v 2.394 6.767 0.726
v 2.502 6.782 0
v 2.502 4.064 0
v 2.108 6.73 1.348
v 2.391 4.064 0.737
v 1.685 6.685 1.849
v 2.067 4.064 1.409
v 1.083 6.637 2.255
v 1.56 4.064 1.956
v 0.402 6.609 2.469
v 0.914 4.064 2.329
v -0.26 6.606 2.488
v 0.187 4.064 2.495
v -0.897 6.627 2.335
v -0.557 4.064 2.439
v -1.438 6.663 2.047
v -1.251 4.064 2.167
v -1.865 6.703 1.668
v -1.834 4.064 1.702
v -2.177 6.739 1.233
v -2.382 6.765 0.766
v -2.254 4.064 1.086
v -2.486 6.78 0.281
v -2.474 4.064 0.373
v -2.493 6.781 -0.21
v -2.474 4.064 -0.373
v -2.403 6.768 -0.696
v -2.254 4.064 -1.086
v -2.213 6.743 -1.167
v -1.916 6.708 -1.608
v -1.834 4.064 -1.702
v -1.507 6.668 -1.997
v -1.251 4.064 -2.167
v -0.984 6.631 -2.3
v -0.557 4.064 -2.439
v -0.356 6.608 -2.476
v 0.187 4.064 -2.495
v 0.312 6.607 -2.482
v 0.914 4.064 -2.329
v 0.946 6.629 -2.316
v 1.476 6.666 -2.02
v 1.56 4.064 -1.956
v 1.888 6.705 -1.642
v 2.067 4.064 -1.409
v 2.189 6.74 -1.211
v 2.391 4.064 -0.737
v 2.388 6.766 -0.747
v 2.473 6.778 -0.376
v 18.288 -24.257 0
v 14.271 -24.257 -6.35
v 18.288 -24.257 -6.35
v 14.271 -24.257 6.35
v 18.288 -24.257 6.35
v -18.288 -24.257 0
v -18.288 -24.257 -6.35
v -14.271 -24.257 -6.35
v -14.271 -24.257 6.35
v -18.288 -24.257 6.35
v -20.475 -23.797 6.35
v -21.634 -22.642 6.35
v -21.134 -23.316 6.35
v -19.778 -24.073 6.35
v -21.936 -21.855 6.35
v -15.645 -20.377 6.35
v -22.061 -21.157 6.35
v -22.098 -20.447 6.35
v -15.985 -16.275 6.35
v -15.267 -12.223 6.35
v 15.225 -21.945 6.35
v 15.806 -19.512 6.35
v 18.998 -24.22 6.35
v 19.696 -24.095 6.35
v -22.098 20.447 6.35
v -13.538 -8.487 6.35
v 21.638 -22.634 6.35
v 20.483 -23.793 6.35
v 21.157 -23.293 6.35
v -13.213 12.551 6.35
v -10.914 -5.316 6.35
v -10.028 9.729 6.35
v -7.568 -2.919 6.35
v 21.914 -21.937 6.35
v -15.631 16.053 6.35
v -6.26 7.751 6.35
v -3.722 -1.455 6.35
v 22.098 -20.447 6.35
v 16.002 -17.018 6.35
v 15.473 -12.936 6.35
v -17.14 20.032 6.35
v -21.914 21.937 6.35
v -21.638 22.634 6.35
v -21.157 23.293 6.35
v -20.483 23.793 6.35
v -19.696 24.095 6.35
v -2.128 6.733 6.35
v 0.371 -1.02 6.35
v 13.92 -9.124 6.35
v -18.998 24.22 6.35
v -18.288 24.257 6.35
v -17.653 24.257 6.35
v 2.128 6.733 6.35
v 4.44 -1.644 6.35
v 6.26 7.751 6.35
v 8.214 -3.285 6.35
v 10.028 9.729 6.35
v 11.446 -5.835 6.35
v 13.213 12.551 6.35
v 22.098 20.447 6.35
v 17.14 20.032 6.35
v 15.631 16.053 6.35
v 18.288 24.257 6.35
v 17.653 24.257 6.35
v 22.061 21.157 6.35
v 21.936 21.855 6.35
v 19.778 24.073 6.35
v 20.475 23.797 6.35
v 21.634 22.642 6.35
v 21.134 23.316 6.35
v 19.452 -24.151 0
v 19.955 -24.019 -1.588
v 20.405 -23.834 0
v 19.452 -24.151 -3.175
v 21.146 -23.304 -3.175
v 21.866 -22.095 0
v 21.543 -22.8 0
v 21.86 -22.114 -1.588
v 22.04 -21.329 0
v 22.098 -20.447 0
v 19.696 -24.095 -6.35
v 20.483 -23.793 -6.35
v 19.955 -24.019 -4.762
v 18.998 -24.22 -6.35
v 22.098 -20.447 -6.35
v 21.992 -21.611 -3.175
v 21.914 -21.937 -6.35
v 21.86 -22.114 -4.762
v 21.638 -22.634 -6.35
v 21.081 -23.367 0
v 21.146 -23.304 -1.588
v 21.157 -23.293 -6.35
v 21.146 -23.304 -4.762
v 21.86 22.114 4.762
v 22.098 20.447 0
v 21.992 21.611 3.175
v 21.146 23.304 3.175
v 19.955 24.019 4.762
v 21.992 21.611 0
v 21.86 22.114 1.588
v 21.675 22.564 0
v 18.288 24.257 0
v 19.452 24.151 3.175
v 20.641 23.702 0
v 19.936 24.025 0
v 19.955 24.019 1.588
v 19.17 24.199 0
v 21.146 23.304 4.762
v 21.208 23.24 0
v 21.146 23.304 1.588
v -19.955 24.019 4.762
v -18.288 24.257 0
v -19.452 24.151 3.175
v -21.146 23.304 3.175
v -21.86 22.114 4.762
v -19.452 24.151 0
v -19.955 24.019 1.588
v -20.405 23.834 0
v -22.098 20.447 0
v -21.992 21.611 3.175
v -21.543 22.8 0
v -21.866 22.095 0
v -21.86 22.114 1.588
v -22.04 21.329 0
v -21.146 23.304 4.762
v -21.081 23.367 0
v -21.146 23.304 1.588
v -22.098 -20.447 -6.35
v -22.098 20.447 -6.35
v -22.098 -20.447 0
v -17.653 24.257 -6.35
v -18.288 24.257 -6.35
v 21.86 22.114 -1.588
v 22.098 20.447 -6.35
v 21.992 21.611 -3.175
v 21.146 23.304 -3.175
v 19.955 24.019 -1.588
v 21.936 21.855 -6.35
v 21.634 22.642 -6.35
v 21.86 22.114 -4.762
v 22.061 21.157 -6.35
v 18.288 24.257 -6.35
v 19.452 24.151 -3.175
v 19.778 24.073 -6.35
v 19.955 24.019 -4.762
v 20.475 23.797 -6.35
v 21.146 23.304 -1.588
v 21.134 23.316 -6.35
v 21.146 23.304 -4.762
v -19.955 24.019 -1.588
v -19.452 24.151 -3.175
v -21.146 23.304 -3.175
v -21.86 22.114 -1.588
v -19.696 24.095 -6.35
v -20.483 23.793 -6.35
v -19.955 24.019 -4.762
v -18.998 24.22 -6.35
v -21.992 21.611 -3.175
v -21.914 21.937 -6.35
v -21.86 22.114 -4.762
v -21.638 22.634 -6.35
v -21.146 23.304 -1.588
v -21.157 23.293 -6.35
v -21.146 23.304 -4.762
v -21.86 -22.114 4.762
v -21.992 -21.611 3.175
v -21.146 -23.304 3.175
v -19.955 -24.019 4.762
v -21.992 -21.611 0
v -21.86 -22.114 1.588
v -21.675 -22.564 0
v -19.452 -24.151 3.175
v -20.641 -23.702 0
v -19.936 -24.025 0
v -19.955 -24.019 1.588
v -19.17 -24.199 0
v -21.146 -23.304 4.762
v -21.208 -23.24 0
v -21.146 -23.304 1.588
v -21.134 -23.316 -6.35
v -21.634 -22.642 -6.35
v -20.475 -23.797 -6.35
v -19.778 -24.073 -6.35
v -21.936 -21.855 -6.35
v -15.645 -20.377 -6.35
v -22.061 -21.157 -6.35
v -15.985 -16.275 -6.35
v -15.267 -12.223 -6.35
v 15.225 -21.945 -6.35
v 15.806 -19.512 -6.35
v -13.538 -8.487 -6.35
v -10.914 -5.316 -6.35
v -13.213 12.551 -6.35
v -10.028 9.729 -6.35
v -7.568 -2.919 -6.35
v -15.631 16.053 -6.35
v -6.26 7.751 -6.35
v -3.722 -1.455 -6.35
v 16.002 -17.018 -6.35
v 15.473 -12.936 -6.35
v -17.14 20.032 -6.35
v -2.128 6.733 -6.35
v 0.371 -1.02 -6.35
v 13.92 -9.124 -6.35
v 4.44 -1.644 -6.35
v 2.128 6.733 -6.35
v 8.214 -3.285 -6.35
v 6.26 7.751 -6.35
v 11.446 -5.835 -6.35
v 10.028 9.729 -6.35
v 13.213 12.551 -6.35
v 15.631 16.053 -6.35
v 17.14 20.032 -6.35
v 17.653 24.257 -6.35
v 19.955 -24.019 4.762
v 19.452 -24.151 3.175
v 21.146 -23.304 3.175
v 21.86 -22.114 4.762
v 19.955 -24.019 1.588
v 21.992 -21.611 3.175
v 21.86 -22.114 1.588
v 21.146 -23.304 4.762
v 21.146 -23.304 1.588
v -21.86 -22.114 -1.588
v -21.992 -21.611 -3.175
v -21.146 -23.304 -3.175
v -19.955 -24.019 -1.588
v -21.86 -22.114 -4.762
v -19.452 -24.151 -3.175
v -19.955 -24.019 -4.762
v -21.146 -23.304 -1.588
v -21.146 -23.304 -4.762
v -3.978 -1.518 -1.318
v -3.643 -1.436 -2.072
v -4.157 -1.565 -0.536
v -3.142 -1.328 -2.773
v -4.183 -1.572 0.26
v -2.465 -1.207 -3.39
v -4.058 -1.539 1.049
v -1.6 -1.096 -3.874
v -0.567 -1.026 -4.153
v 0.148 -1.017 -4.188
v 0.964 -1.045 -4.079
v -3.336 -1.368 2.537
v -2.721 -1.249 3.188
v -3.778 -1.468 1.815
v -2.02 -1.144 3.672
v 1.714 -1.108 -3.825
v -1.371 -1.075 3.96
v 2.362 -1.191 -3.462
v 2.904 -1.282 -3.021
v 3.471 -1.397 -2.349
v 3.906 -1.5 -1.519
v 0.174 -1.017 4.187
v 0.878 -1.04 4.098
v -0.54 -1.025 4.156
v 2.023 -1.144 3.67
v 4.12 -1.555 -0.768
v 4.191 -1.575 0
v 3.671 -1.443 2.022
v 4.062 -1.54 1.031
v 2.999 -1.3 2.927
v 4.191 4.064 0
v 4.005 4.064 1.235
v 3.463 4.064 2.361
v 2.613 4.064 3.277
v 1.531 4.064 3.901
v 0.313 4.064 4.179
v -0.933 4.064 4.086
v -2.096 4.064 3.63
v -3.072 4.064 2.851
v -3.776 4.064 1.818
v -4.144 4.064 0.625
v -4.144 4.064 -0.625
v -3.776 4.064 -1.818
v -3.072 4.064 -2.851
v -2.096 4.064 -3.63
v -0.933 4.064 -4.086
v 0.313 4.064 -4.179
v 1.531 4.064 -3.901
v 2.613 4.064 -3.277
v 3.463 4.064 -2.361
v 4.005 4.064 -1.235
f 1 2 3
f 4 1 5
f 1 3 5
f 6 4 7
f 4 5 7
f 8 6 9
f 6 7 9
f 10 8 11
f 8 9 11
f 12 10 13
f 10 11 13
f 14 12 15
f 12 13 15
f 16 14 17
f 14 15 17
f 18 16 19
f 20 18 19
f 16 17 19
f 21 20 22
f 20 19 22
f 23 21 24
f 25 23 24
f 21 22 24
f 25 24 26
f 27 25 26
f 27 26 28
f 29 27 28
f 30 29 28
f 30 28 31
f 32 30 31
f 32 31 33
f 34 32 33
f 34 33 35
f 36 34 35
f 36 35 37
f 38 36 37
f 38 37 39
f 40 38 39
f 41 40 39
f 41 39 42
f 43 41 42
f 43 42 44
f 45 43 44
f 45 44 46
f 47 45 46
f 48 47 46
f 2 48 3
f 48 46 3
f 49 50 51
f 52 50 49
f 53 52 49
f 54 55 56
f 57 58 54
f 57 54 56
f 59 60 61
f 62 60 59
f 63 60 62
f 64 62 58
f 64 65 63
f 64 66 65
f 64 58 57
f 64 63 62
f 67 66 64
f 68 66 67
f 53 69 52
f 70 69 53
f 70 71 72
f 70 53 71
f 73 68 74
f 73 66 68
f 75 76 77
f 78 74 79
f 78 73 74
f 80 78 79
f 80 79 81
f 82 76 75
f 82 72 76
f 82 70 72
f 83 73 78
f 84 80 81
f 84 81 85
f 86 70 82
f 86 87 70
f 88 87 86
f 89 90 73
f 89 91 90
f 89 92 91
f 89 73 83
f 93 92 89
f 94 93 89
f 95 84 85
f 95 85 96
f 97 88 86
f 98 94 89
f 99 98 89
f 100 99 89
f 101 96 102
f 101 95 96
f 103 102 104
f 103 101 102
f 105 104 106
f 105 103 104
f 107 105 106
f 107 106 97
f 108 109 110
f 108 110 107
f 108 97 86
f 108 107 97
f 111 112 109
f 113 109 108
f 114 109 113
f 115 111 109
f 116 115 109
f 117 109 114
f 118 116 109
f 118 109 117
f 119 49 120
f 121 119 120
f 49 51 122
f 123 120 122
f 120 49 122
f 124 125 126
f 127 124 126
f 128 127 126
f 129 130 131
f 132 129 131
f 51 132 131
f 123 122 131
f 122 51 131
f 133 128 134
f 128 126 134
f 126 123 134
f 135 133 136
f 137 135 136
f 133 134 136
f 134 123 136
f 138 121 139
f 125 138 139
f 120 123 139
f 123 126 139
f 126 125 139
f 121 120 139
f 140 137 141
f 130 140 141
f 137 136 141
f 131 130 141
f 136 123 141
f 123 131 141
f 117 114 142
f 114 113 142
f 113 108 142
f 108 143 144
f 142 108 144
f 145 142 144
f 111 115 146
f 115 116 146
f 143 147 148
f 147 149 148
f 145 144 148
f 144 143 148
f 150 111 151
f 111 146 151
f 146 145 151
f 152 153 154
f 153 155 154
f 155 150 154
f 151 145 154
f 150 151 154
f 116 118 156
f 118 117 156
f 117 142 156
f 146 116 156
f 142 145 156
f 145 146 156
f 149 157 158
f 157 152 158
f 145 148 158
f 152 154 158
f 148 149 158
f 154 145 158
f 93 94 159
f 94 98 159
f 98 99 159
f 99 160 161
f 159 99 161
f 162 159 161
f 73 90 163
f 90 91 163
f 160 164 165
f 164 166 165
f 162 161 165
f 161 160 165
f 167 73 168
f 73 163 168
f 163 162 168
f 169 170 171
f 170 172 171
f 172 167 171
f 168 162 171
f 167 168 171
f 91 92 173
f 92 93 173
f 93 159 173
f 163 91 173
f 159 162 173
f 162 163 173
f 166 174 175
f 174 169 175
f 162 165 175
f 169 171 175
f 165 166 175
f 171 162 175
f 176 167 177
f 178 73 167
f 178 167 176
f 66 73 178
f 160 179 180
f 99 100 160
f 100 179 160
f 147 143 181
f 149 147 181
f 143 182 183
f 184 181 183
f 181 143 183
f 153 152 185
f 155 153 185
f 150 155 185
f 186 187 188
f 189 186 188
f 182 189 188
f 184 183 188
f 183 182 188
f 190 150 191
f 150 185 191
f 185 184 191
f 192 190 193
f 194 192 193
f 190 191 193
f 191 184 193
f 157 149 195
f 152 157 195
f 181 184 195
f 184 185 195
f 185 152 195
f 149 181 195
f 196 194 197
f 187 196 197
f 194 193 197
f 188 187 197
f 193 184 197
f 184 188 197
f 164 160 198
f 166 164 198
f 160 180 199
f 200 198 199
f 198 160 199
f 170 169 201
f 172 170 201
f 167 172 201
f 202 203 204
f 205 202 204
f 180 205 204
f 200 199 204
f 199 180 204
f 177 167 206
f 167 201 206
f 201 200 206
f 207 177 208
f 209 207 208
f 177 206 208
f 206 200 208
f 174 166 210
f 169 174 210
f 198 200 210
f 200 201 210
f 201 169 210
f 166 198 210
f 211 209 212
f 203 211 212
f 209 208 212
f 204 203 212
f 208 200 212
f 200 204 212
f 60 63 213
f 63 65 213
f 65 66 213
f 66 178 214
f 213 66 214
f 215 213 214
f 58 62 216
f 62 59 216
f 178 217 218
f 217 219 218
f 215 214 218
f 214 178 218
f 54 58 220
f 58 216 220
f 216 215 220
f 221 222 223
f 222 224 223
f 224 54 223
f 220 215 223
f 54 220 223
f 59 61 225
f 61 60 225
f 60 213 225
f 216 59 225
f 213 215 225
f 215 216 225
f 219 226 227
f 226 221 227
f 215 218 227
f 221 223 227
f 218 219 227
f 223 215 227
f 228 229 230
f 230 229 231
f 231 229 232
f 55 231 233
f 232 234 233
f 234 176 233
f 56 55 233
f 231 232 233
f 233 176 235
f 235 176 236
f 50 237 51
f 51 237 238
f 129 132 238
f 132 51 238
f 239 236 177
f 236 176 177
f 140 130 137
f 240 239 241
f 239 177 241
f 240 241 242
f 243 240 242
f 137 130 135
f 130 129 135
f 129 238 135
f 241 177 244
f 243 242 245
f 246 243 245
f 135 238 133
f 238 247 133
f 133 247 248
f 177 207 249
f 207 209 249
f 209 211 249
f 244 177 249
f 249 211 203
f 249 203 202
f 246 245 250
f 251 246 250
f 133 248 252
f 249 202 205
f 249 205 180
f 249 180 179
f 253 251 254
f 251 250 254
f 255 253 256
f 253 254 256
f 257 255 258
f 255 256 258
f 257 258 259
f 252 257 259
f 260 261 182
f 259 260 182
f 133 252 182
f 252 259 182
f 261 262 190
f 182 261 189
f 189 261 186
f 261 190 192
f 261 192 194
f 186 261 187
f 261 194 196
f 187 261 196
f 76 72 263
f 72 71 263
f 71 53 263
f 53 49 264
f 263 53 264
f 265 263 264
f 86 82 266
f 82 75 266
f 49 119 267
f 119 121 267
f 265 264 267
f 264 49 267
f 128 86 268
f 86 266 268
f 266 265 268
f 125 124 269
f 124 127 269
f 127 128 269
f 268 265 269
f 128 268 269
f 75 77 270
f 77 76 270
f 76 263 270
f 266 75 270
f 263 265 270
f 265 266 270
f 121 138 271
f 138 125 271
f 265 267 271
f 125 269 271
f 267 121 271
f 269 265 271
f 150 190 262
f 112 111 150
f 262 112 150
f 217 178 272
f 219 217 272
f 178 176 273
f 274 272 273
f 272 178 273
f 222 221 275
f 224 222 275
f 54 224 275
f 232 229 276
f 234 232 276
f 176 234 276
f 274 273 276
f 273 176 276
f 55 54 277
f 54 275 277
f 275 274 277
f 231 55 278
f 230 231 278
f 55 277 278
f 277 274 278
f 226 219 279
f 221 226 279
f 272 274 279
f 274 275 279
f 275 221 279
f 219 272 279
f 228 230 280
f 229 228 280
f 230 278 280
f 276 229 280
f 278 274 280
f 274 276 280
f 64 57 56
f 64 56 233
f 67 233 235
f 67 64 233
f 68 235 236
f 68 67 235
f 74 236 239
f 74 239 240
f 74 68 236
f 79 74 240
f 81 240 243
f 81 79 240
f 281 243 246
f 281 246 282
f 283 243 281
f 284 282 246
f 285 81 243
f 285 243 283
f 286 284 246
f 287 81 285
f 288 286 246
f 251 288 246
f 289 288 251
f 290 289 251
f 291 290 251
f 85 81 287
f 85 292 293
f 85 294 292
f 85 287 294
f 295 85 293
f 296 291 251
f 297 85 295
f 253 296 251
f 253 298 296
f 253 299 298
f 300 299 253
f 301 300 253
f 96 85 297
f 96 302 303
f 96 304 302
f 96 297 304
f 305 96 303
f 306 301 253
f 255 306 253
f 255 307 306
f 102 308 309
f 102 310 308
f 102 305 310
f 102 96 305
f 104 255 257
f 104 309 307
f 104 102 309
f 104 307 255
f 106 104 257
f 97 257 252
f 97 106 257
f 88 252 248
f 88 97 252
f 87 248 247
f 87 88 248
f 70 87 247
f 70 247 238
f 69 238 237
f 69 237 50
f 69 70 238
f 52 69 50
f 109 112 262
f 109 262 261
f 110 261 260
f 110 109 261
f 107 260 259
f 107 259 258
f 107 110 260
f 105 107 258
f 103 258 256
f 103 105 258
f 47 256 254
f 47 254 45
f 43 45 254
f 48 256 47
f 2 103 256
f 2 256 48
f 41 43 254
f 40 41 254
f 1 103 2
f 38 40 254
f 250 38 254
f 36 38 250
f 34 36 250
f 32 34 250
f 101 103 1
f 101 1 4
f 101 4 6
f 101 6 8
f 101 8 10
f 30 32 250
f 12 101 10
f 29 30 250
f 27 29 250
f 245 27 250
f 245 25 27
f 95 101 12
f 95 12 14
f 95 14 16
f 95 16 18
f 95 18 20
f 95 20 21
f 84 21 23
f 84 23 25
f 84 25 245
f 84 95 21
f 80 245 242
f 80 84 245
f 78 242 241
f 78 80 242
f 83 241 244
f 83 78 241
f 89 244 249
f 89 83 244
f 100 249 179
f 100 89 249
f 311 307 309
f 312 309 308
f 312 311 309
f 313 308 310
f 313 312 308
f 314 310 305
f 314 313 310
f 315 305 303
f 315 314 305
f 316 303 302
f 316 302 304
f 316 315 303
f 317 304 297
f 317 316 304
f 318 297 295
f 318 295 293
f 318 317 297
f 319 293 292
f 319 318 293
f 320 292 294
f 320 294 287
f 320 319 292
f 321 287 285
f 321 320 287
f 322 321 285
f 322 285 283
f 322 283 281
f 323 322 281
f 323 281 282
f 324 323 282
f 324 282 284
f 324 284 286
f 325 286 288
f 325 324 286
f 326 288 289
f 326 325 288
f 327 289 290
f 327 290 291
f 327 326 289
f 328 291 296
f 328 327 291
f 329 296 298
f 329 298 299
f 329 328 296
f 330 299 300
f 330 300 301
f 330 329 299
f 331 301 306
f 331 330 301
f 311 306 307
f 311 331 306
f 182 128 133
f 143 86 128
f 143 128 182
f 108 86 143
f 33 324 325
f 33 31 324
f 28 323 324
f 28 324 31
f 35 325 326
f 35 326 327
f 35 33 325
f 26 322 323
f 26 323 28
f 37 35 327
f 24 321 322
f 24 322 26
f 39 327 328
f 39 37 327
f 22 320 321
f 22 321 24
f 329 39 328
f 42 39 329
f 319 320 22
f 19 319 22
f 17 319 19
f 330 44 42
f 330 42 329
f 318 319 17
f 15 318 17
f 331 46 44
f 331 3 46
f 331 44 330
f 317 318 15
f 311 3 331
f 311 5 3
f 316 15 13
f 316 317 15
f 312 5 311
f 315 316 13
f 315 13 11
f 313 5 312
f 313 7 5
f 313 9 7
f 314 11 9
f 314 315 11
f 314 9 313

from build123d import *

# Parameters (mm, degrees)
F1_DEPTH      = 6.35
F1_DEPTH_BACK = 6.35
F2_R          = 4.191
F2_R_2        = 2.5019
F3_DEPTH      = 4.064
F3_DEPTH_BACK = 24.258
F4_DEPTH      = 24.258
F5_T1_DEPTH   = 15.875
F5_T3_DEPTH   = 15.875


# Not quite as in the source:
# - a fillet or chamfer that OpenCascade refuses, or shapes differently, is made with other operations: its cross-section is extruded or revolved along the edge and cut away or added
# - a feature names something its author has since deleted; it is built from what else it names


with BuildPart() as f1:
    # F0 (on Top) → F1 (new body, two sides)
    with BuildSketch(Plane.XY) as f1_sk:
        with BuildLine():
            Line((22.098, 24.257), (17.653, 24.257))
            ThreePointArc((17.653, 24.257), (0, 6.604), (-17.653, 24.257))
            Line((-17.653, 24.257), (-22.098, 24.257))
            Line((-22.098, 24.257), (-22.098, -24.257))
            Line((-22.098, -24.257), (-14.2709804499, -24.257))
            ThreePointArc((-14.2709804498, -24.257), (-3.7215436879, -1.454770368), (16.002, -17.018))
            ThreePointArc((16.002, -17.018), (15.563229632, -20.7395436879), (14.2709804499, -24.257))
            Line((14.2709804499, -24.257), (22.098, -24.257))
            Line((22.098, -24.257), (22.098, 24.257))
        make_face()
    extrude(amount=F1_DEPTH)
    extrude(f1_sk.sketch, amount=-F1_DEPTH_BACK)

    # F2 (on Front) → F3 (cut, two sides)
    with BuildSketch(Plane.XZ) as f3_sk:
        Circle(F2_R)
        Circle(F2_R_2, mode=Mode.SUBTRACT)
        Circle(F2_R_2)
    extrude(amount=-F3_DEPTH, mode=Mode.SUBTRACT)
    extrude(f3_sk.sketch, amount=F3_DEPTH_BACK, mode=Mode.SUBTRACT)

    # F2 (on Front) → F4 (cut, through all)
    with BuildSketch(Plane.XZ):
        Circle(F2_R_2)
    extrude(amount=-F4_DEPTH, mode=Mode.SUBTRACT)

    # F5: fillet of radius 3.81 on 8 edges, made by hand

    # F5_s2 → F5_t1 (cut)
    with BuildSketch(Plane.XY):
        with BuildLine():
            add(Edge.make_bspline(
                [(-22.098, -20.447), (-22.098, -24.257), (-18.288, -24.257)],
                knots=[0, 0, 0, 1, 1, 1], degree=2, weights=[1, 1, 1]))
            Line((-18.288, -24.257), (-22.098, -24.257))
            Line((-22.098, -24.257), (-22.098, -20.447))
        make_face()
        with BuildLine():
            add(Edge.make_bspline(
                [(18.288, -24.257), (22.098, -24.257), (22.098, -20.447)],
                knots=[0, 0, 0, 1, 1, 1], degree=2, weights=[1, 1, 1]))
            Line((22.098, -20.447), (22.098, -24.257))
            Line((22.098, -24.257), (18.288, -24.257))
        make_face()
        with BuildLine():
            add(Edge.make_bspline(
                [(-18.288, 24.257), (-22.098, 24.257), (-22.098, 20.447)],
                knots=[0, 0, 0, 1, 1, 1], degree=2, weights=[1, 1, 1]))
            Line((-22.098, 20.447), (-22.098, 24.257))
            Line((-22.098, 24.257), (-18.288, 24.257))
        make_face()
        with BuildLine():
            add(Edge.make_bspline(
                [(22.098, 20.447), (22.098, 24.257), (18.288, 24.257)],
                knots=[0, 0, 0, 1, 1, 1], degree=2, weights=[1, 1, 1]))
            Line((18.288, 24.257), (22.098, 24.257))
            Line((22.098, 24.257), (22.098, 20.447))
        make_face()
    extrude(amount=F5_T1_DEPTH, mode=Mode.SUBTRACT)

    # F5_s4 → F5_t3 (cut)
    with BuildSketch(Plane.XY.offset(-15.875)):
        with BuildLine():
            add(Edge.make_bspline(
                [(-22.098, -20.447), (-22.098, -24.257), (-18.288, -24.257)],
                knots=[0, 0, 0, 1, 1, 1], degree=2, weights=[1, 1, 1]))
            Line((-18.288, -24.257), (-22.098, -24.257))
            Line((-22.098, -24.257), (-22.098, -20.447))
        make_face()
        with BuildLine():
            add(Edge.make_bspline(
                [(18.288, -24.257), (22.098, -24.257), (22.098, -20.447)],
                knots=[0, 0, 0, 1, 1, 1], degree=2, weights=[1, 1, 1]))
            Line((22.098, -20.447), (22.098, -24.257))
            Line((22.098, -24.257), (18.288, -24.257))
        make_face()
        with BuildLine():
            add(Edge.make_bspline(
                [(-18.288, 24.257), (-22.098, 24.257), (-22.098, 20.447)],
                knots=[0, 0, 0, 1, 1, 1], degree=2, weights=[1, 1, 1]))
            Line((-22.098, 20.447), (-22.098, 24.257))
            Line((-22.098, 24.257), (-18.288, 24.257))
        make_face()
        with BuildLine():
            add(Edge.make_bspline(
                [(22.098, 20.447), (22.098, 24.257), (18.288, 24.257)],
                knots=[0, 0, 0, 1, 1, 1], degree=2, weights=[1, 1, 1]))
            Line((18.288, 24.257), (22.098, 24.257))
            Line((22.098, 24.257), (22.098, 20.447))
        make_face()
    extrude(amount=F5_T3_DEPTH, mode=Mode.SUBTRACT)


solid = f1.part
